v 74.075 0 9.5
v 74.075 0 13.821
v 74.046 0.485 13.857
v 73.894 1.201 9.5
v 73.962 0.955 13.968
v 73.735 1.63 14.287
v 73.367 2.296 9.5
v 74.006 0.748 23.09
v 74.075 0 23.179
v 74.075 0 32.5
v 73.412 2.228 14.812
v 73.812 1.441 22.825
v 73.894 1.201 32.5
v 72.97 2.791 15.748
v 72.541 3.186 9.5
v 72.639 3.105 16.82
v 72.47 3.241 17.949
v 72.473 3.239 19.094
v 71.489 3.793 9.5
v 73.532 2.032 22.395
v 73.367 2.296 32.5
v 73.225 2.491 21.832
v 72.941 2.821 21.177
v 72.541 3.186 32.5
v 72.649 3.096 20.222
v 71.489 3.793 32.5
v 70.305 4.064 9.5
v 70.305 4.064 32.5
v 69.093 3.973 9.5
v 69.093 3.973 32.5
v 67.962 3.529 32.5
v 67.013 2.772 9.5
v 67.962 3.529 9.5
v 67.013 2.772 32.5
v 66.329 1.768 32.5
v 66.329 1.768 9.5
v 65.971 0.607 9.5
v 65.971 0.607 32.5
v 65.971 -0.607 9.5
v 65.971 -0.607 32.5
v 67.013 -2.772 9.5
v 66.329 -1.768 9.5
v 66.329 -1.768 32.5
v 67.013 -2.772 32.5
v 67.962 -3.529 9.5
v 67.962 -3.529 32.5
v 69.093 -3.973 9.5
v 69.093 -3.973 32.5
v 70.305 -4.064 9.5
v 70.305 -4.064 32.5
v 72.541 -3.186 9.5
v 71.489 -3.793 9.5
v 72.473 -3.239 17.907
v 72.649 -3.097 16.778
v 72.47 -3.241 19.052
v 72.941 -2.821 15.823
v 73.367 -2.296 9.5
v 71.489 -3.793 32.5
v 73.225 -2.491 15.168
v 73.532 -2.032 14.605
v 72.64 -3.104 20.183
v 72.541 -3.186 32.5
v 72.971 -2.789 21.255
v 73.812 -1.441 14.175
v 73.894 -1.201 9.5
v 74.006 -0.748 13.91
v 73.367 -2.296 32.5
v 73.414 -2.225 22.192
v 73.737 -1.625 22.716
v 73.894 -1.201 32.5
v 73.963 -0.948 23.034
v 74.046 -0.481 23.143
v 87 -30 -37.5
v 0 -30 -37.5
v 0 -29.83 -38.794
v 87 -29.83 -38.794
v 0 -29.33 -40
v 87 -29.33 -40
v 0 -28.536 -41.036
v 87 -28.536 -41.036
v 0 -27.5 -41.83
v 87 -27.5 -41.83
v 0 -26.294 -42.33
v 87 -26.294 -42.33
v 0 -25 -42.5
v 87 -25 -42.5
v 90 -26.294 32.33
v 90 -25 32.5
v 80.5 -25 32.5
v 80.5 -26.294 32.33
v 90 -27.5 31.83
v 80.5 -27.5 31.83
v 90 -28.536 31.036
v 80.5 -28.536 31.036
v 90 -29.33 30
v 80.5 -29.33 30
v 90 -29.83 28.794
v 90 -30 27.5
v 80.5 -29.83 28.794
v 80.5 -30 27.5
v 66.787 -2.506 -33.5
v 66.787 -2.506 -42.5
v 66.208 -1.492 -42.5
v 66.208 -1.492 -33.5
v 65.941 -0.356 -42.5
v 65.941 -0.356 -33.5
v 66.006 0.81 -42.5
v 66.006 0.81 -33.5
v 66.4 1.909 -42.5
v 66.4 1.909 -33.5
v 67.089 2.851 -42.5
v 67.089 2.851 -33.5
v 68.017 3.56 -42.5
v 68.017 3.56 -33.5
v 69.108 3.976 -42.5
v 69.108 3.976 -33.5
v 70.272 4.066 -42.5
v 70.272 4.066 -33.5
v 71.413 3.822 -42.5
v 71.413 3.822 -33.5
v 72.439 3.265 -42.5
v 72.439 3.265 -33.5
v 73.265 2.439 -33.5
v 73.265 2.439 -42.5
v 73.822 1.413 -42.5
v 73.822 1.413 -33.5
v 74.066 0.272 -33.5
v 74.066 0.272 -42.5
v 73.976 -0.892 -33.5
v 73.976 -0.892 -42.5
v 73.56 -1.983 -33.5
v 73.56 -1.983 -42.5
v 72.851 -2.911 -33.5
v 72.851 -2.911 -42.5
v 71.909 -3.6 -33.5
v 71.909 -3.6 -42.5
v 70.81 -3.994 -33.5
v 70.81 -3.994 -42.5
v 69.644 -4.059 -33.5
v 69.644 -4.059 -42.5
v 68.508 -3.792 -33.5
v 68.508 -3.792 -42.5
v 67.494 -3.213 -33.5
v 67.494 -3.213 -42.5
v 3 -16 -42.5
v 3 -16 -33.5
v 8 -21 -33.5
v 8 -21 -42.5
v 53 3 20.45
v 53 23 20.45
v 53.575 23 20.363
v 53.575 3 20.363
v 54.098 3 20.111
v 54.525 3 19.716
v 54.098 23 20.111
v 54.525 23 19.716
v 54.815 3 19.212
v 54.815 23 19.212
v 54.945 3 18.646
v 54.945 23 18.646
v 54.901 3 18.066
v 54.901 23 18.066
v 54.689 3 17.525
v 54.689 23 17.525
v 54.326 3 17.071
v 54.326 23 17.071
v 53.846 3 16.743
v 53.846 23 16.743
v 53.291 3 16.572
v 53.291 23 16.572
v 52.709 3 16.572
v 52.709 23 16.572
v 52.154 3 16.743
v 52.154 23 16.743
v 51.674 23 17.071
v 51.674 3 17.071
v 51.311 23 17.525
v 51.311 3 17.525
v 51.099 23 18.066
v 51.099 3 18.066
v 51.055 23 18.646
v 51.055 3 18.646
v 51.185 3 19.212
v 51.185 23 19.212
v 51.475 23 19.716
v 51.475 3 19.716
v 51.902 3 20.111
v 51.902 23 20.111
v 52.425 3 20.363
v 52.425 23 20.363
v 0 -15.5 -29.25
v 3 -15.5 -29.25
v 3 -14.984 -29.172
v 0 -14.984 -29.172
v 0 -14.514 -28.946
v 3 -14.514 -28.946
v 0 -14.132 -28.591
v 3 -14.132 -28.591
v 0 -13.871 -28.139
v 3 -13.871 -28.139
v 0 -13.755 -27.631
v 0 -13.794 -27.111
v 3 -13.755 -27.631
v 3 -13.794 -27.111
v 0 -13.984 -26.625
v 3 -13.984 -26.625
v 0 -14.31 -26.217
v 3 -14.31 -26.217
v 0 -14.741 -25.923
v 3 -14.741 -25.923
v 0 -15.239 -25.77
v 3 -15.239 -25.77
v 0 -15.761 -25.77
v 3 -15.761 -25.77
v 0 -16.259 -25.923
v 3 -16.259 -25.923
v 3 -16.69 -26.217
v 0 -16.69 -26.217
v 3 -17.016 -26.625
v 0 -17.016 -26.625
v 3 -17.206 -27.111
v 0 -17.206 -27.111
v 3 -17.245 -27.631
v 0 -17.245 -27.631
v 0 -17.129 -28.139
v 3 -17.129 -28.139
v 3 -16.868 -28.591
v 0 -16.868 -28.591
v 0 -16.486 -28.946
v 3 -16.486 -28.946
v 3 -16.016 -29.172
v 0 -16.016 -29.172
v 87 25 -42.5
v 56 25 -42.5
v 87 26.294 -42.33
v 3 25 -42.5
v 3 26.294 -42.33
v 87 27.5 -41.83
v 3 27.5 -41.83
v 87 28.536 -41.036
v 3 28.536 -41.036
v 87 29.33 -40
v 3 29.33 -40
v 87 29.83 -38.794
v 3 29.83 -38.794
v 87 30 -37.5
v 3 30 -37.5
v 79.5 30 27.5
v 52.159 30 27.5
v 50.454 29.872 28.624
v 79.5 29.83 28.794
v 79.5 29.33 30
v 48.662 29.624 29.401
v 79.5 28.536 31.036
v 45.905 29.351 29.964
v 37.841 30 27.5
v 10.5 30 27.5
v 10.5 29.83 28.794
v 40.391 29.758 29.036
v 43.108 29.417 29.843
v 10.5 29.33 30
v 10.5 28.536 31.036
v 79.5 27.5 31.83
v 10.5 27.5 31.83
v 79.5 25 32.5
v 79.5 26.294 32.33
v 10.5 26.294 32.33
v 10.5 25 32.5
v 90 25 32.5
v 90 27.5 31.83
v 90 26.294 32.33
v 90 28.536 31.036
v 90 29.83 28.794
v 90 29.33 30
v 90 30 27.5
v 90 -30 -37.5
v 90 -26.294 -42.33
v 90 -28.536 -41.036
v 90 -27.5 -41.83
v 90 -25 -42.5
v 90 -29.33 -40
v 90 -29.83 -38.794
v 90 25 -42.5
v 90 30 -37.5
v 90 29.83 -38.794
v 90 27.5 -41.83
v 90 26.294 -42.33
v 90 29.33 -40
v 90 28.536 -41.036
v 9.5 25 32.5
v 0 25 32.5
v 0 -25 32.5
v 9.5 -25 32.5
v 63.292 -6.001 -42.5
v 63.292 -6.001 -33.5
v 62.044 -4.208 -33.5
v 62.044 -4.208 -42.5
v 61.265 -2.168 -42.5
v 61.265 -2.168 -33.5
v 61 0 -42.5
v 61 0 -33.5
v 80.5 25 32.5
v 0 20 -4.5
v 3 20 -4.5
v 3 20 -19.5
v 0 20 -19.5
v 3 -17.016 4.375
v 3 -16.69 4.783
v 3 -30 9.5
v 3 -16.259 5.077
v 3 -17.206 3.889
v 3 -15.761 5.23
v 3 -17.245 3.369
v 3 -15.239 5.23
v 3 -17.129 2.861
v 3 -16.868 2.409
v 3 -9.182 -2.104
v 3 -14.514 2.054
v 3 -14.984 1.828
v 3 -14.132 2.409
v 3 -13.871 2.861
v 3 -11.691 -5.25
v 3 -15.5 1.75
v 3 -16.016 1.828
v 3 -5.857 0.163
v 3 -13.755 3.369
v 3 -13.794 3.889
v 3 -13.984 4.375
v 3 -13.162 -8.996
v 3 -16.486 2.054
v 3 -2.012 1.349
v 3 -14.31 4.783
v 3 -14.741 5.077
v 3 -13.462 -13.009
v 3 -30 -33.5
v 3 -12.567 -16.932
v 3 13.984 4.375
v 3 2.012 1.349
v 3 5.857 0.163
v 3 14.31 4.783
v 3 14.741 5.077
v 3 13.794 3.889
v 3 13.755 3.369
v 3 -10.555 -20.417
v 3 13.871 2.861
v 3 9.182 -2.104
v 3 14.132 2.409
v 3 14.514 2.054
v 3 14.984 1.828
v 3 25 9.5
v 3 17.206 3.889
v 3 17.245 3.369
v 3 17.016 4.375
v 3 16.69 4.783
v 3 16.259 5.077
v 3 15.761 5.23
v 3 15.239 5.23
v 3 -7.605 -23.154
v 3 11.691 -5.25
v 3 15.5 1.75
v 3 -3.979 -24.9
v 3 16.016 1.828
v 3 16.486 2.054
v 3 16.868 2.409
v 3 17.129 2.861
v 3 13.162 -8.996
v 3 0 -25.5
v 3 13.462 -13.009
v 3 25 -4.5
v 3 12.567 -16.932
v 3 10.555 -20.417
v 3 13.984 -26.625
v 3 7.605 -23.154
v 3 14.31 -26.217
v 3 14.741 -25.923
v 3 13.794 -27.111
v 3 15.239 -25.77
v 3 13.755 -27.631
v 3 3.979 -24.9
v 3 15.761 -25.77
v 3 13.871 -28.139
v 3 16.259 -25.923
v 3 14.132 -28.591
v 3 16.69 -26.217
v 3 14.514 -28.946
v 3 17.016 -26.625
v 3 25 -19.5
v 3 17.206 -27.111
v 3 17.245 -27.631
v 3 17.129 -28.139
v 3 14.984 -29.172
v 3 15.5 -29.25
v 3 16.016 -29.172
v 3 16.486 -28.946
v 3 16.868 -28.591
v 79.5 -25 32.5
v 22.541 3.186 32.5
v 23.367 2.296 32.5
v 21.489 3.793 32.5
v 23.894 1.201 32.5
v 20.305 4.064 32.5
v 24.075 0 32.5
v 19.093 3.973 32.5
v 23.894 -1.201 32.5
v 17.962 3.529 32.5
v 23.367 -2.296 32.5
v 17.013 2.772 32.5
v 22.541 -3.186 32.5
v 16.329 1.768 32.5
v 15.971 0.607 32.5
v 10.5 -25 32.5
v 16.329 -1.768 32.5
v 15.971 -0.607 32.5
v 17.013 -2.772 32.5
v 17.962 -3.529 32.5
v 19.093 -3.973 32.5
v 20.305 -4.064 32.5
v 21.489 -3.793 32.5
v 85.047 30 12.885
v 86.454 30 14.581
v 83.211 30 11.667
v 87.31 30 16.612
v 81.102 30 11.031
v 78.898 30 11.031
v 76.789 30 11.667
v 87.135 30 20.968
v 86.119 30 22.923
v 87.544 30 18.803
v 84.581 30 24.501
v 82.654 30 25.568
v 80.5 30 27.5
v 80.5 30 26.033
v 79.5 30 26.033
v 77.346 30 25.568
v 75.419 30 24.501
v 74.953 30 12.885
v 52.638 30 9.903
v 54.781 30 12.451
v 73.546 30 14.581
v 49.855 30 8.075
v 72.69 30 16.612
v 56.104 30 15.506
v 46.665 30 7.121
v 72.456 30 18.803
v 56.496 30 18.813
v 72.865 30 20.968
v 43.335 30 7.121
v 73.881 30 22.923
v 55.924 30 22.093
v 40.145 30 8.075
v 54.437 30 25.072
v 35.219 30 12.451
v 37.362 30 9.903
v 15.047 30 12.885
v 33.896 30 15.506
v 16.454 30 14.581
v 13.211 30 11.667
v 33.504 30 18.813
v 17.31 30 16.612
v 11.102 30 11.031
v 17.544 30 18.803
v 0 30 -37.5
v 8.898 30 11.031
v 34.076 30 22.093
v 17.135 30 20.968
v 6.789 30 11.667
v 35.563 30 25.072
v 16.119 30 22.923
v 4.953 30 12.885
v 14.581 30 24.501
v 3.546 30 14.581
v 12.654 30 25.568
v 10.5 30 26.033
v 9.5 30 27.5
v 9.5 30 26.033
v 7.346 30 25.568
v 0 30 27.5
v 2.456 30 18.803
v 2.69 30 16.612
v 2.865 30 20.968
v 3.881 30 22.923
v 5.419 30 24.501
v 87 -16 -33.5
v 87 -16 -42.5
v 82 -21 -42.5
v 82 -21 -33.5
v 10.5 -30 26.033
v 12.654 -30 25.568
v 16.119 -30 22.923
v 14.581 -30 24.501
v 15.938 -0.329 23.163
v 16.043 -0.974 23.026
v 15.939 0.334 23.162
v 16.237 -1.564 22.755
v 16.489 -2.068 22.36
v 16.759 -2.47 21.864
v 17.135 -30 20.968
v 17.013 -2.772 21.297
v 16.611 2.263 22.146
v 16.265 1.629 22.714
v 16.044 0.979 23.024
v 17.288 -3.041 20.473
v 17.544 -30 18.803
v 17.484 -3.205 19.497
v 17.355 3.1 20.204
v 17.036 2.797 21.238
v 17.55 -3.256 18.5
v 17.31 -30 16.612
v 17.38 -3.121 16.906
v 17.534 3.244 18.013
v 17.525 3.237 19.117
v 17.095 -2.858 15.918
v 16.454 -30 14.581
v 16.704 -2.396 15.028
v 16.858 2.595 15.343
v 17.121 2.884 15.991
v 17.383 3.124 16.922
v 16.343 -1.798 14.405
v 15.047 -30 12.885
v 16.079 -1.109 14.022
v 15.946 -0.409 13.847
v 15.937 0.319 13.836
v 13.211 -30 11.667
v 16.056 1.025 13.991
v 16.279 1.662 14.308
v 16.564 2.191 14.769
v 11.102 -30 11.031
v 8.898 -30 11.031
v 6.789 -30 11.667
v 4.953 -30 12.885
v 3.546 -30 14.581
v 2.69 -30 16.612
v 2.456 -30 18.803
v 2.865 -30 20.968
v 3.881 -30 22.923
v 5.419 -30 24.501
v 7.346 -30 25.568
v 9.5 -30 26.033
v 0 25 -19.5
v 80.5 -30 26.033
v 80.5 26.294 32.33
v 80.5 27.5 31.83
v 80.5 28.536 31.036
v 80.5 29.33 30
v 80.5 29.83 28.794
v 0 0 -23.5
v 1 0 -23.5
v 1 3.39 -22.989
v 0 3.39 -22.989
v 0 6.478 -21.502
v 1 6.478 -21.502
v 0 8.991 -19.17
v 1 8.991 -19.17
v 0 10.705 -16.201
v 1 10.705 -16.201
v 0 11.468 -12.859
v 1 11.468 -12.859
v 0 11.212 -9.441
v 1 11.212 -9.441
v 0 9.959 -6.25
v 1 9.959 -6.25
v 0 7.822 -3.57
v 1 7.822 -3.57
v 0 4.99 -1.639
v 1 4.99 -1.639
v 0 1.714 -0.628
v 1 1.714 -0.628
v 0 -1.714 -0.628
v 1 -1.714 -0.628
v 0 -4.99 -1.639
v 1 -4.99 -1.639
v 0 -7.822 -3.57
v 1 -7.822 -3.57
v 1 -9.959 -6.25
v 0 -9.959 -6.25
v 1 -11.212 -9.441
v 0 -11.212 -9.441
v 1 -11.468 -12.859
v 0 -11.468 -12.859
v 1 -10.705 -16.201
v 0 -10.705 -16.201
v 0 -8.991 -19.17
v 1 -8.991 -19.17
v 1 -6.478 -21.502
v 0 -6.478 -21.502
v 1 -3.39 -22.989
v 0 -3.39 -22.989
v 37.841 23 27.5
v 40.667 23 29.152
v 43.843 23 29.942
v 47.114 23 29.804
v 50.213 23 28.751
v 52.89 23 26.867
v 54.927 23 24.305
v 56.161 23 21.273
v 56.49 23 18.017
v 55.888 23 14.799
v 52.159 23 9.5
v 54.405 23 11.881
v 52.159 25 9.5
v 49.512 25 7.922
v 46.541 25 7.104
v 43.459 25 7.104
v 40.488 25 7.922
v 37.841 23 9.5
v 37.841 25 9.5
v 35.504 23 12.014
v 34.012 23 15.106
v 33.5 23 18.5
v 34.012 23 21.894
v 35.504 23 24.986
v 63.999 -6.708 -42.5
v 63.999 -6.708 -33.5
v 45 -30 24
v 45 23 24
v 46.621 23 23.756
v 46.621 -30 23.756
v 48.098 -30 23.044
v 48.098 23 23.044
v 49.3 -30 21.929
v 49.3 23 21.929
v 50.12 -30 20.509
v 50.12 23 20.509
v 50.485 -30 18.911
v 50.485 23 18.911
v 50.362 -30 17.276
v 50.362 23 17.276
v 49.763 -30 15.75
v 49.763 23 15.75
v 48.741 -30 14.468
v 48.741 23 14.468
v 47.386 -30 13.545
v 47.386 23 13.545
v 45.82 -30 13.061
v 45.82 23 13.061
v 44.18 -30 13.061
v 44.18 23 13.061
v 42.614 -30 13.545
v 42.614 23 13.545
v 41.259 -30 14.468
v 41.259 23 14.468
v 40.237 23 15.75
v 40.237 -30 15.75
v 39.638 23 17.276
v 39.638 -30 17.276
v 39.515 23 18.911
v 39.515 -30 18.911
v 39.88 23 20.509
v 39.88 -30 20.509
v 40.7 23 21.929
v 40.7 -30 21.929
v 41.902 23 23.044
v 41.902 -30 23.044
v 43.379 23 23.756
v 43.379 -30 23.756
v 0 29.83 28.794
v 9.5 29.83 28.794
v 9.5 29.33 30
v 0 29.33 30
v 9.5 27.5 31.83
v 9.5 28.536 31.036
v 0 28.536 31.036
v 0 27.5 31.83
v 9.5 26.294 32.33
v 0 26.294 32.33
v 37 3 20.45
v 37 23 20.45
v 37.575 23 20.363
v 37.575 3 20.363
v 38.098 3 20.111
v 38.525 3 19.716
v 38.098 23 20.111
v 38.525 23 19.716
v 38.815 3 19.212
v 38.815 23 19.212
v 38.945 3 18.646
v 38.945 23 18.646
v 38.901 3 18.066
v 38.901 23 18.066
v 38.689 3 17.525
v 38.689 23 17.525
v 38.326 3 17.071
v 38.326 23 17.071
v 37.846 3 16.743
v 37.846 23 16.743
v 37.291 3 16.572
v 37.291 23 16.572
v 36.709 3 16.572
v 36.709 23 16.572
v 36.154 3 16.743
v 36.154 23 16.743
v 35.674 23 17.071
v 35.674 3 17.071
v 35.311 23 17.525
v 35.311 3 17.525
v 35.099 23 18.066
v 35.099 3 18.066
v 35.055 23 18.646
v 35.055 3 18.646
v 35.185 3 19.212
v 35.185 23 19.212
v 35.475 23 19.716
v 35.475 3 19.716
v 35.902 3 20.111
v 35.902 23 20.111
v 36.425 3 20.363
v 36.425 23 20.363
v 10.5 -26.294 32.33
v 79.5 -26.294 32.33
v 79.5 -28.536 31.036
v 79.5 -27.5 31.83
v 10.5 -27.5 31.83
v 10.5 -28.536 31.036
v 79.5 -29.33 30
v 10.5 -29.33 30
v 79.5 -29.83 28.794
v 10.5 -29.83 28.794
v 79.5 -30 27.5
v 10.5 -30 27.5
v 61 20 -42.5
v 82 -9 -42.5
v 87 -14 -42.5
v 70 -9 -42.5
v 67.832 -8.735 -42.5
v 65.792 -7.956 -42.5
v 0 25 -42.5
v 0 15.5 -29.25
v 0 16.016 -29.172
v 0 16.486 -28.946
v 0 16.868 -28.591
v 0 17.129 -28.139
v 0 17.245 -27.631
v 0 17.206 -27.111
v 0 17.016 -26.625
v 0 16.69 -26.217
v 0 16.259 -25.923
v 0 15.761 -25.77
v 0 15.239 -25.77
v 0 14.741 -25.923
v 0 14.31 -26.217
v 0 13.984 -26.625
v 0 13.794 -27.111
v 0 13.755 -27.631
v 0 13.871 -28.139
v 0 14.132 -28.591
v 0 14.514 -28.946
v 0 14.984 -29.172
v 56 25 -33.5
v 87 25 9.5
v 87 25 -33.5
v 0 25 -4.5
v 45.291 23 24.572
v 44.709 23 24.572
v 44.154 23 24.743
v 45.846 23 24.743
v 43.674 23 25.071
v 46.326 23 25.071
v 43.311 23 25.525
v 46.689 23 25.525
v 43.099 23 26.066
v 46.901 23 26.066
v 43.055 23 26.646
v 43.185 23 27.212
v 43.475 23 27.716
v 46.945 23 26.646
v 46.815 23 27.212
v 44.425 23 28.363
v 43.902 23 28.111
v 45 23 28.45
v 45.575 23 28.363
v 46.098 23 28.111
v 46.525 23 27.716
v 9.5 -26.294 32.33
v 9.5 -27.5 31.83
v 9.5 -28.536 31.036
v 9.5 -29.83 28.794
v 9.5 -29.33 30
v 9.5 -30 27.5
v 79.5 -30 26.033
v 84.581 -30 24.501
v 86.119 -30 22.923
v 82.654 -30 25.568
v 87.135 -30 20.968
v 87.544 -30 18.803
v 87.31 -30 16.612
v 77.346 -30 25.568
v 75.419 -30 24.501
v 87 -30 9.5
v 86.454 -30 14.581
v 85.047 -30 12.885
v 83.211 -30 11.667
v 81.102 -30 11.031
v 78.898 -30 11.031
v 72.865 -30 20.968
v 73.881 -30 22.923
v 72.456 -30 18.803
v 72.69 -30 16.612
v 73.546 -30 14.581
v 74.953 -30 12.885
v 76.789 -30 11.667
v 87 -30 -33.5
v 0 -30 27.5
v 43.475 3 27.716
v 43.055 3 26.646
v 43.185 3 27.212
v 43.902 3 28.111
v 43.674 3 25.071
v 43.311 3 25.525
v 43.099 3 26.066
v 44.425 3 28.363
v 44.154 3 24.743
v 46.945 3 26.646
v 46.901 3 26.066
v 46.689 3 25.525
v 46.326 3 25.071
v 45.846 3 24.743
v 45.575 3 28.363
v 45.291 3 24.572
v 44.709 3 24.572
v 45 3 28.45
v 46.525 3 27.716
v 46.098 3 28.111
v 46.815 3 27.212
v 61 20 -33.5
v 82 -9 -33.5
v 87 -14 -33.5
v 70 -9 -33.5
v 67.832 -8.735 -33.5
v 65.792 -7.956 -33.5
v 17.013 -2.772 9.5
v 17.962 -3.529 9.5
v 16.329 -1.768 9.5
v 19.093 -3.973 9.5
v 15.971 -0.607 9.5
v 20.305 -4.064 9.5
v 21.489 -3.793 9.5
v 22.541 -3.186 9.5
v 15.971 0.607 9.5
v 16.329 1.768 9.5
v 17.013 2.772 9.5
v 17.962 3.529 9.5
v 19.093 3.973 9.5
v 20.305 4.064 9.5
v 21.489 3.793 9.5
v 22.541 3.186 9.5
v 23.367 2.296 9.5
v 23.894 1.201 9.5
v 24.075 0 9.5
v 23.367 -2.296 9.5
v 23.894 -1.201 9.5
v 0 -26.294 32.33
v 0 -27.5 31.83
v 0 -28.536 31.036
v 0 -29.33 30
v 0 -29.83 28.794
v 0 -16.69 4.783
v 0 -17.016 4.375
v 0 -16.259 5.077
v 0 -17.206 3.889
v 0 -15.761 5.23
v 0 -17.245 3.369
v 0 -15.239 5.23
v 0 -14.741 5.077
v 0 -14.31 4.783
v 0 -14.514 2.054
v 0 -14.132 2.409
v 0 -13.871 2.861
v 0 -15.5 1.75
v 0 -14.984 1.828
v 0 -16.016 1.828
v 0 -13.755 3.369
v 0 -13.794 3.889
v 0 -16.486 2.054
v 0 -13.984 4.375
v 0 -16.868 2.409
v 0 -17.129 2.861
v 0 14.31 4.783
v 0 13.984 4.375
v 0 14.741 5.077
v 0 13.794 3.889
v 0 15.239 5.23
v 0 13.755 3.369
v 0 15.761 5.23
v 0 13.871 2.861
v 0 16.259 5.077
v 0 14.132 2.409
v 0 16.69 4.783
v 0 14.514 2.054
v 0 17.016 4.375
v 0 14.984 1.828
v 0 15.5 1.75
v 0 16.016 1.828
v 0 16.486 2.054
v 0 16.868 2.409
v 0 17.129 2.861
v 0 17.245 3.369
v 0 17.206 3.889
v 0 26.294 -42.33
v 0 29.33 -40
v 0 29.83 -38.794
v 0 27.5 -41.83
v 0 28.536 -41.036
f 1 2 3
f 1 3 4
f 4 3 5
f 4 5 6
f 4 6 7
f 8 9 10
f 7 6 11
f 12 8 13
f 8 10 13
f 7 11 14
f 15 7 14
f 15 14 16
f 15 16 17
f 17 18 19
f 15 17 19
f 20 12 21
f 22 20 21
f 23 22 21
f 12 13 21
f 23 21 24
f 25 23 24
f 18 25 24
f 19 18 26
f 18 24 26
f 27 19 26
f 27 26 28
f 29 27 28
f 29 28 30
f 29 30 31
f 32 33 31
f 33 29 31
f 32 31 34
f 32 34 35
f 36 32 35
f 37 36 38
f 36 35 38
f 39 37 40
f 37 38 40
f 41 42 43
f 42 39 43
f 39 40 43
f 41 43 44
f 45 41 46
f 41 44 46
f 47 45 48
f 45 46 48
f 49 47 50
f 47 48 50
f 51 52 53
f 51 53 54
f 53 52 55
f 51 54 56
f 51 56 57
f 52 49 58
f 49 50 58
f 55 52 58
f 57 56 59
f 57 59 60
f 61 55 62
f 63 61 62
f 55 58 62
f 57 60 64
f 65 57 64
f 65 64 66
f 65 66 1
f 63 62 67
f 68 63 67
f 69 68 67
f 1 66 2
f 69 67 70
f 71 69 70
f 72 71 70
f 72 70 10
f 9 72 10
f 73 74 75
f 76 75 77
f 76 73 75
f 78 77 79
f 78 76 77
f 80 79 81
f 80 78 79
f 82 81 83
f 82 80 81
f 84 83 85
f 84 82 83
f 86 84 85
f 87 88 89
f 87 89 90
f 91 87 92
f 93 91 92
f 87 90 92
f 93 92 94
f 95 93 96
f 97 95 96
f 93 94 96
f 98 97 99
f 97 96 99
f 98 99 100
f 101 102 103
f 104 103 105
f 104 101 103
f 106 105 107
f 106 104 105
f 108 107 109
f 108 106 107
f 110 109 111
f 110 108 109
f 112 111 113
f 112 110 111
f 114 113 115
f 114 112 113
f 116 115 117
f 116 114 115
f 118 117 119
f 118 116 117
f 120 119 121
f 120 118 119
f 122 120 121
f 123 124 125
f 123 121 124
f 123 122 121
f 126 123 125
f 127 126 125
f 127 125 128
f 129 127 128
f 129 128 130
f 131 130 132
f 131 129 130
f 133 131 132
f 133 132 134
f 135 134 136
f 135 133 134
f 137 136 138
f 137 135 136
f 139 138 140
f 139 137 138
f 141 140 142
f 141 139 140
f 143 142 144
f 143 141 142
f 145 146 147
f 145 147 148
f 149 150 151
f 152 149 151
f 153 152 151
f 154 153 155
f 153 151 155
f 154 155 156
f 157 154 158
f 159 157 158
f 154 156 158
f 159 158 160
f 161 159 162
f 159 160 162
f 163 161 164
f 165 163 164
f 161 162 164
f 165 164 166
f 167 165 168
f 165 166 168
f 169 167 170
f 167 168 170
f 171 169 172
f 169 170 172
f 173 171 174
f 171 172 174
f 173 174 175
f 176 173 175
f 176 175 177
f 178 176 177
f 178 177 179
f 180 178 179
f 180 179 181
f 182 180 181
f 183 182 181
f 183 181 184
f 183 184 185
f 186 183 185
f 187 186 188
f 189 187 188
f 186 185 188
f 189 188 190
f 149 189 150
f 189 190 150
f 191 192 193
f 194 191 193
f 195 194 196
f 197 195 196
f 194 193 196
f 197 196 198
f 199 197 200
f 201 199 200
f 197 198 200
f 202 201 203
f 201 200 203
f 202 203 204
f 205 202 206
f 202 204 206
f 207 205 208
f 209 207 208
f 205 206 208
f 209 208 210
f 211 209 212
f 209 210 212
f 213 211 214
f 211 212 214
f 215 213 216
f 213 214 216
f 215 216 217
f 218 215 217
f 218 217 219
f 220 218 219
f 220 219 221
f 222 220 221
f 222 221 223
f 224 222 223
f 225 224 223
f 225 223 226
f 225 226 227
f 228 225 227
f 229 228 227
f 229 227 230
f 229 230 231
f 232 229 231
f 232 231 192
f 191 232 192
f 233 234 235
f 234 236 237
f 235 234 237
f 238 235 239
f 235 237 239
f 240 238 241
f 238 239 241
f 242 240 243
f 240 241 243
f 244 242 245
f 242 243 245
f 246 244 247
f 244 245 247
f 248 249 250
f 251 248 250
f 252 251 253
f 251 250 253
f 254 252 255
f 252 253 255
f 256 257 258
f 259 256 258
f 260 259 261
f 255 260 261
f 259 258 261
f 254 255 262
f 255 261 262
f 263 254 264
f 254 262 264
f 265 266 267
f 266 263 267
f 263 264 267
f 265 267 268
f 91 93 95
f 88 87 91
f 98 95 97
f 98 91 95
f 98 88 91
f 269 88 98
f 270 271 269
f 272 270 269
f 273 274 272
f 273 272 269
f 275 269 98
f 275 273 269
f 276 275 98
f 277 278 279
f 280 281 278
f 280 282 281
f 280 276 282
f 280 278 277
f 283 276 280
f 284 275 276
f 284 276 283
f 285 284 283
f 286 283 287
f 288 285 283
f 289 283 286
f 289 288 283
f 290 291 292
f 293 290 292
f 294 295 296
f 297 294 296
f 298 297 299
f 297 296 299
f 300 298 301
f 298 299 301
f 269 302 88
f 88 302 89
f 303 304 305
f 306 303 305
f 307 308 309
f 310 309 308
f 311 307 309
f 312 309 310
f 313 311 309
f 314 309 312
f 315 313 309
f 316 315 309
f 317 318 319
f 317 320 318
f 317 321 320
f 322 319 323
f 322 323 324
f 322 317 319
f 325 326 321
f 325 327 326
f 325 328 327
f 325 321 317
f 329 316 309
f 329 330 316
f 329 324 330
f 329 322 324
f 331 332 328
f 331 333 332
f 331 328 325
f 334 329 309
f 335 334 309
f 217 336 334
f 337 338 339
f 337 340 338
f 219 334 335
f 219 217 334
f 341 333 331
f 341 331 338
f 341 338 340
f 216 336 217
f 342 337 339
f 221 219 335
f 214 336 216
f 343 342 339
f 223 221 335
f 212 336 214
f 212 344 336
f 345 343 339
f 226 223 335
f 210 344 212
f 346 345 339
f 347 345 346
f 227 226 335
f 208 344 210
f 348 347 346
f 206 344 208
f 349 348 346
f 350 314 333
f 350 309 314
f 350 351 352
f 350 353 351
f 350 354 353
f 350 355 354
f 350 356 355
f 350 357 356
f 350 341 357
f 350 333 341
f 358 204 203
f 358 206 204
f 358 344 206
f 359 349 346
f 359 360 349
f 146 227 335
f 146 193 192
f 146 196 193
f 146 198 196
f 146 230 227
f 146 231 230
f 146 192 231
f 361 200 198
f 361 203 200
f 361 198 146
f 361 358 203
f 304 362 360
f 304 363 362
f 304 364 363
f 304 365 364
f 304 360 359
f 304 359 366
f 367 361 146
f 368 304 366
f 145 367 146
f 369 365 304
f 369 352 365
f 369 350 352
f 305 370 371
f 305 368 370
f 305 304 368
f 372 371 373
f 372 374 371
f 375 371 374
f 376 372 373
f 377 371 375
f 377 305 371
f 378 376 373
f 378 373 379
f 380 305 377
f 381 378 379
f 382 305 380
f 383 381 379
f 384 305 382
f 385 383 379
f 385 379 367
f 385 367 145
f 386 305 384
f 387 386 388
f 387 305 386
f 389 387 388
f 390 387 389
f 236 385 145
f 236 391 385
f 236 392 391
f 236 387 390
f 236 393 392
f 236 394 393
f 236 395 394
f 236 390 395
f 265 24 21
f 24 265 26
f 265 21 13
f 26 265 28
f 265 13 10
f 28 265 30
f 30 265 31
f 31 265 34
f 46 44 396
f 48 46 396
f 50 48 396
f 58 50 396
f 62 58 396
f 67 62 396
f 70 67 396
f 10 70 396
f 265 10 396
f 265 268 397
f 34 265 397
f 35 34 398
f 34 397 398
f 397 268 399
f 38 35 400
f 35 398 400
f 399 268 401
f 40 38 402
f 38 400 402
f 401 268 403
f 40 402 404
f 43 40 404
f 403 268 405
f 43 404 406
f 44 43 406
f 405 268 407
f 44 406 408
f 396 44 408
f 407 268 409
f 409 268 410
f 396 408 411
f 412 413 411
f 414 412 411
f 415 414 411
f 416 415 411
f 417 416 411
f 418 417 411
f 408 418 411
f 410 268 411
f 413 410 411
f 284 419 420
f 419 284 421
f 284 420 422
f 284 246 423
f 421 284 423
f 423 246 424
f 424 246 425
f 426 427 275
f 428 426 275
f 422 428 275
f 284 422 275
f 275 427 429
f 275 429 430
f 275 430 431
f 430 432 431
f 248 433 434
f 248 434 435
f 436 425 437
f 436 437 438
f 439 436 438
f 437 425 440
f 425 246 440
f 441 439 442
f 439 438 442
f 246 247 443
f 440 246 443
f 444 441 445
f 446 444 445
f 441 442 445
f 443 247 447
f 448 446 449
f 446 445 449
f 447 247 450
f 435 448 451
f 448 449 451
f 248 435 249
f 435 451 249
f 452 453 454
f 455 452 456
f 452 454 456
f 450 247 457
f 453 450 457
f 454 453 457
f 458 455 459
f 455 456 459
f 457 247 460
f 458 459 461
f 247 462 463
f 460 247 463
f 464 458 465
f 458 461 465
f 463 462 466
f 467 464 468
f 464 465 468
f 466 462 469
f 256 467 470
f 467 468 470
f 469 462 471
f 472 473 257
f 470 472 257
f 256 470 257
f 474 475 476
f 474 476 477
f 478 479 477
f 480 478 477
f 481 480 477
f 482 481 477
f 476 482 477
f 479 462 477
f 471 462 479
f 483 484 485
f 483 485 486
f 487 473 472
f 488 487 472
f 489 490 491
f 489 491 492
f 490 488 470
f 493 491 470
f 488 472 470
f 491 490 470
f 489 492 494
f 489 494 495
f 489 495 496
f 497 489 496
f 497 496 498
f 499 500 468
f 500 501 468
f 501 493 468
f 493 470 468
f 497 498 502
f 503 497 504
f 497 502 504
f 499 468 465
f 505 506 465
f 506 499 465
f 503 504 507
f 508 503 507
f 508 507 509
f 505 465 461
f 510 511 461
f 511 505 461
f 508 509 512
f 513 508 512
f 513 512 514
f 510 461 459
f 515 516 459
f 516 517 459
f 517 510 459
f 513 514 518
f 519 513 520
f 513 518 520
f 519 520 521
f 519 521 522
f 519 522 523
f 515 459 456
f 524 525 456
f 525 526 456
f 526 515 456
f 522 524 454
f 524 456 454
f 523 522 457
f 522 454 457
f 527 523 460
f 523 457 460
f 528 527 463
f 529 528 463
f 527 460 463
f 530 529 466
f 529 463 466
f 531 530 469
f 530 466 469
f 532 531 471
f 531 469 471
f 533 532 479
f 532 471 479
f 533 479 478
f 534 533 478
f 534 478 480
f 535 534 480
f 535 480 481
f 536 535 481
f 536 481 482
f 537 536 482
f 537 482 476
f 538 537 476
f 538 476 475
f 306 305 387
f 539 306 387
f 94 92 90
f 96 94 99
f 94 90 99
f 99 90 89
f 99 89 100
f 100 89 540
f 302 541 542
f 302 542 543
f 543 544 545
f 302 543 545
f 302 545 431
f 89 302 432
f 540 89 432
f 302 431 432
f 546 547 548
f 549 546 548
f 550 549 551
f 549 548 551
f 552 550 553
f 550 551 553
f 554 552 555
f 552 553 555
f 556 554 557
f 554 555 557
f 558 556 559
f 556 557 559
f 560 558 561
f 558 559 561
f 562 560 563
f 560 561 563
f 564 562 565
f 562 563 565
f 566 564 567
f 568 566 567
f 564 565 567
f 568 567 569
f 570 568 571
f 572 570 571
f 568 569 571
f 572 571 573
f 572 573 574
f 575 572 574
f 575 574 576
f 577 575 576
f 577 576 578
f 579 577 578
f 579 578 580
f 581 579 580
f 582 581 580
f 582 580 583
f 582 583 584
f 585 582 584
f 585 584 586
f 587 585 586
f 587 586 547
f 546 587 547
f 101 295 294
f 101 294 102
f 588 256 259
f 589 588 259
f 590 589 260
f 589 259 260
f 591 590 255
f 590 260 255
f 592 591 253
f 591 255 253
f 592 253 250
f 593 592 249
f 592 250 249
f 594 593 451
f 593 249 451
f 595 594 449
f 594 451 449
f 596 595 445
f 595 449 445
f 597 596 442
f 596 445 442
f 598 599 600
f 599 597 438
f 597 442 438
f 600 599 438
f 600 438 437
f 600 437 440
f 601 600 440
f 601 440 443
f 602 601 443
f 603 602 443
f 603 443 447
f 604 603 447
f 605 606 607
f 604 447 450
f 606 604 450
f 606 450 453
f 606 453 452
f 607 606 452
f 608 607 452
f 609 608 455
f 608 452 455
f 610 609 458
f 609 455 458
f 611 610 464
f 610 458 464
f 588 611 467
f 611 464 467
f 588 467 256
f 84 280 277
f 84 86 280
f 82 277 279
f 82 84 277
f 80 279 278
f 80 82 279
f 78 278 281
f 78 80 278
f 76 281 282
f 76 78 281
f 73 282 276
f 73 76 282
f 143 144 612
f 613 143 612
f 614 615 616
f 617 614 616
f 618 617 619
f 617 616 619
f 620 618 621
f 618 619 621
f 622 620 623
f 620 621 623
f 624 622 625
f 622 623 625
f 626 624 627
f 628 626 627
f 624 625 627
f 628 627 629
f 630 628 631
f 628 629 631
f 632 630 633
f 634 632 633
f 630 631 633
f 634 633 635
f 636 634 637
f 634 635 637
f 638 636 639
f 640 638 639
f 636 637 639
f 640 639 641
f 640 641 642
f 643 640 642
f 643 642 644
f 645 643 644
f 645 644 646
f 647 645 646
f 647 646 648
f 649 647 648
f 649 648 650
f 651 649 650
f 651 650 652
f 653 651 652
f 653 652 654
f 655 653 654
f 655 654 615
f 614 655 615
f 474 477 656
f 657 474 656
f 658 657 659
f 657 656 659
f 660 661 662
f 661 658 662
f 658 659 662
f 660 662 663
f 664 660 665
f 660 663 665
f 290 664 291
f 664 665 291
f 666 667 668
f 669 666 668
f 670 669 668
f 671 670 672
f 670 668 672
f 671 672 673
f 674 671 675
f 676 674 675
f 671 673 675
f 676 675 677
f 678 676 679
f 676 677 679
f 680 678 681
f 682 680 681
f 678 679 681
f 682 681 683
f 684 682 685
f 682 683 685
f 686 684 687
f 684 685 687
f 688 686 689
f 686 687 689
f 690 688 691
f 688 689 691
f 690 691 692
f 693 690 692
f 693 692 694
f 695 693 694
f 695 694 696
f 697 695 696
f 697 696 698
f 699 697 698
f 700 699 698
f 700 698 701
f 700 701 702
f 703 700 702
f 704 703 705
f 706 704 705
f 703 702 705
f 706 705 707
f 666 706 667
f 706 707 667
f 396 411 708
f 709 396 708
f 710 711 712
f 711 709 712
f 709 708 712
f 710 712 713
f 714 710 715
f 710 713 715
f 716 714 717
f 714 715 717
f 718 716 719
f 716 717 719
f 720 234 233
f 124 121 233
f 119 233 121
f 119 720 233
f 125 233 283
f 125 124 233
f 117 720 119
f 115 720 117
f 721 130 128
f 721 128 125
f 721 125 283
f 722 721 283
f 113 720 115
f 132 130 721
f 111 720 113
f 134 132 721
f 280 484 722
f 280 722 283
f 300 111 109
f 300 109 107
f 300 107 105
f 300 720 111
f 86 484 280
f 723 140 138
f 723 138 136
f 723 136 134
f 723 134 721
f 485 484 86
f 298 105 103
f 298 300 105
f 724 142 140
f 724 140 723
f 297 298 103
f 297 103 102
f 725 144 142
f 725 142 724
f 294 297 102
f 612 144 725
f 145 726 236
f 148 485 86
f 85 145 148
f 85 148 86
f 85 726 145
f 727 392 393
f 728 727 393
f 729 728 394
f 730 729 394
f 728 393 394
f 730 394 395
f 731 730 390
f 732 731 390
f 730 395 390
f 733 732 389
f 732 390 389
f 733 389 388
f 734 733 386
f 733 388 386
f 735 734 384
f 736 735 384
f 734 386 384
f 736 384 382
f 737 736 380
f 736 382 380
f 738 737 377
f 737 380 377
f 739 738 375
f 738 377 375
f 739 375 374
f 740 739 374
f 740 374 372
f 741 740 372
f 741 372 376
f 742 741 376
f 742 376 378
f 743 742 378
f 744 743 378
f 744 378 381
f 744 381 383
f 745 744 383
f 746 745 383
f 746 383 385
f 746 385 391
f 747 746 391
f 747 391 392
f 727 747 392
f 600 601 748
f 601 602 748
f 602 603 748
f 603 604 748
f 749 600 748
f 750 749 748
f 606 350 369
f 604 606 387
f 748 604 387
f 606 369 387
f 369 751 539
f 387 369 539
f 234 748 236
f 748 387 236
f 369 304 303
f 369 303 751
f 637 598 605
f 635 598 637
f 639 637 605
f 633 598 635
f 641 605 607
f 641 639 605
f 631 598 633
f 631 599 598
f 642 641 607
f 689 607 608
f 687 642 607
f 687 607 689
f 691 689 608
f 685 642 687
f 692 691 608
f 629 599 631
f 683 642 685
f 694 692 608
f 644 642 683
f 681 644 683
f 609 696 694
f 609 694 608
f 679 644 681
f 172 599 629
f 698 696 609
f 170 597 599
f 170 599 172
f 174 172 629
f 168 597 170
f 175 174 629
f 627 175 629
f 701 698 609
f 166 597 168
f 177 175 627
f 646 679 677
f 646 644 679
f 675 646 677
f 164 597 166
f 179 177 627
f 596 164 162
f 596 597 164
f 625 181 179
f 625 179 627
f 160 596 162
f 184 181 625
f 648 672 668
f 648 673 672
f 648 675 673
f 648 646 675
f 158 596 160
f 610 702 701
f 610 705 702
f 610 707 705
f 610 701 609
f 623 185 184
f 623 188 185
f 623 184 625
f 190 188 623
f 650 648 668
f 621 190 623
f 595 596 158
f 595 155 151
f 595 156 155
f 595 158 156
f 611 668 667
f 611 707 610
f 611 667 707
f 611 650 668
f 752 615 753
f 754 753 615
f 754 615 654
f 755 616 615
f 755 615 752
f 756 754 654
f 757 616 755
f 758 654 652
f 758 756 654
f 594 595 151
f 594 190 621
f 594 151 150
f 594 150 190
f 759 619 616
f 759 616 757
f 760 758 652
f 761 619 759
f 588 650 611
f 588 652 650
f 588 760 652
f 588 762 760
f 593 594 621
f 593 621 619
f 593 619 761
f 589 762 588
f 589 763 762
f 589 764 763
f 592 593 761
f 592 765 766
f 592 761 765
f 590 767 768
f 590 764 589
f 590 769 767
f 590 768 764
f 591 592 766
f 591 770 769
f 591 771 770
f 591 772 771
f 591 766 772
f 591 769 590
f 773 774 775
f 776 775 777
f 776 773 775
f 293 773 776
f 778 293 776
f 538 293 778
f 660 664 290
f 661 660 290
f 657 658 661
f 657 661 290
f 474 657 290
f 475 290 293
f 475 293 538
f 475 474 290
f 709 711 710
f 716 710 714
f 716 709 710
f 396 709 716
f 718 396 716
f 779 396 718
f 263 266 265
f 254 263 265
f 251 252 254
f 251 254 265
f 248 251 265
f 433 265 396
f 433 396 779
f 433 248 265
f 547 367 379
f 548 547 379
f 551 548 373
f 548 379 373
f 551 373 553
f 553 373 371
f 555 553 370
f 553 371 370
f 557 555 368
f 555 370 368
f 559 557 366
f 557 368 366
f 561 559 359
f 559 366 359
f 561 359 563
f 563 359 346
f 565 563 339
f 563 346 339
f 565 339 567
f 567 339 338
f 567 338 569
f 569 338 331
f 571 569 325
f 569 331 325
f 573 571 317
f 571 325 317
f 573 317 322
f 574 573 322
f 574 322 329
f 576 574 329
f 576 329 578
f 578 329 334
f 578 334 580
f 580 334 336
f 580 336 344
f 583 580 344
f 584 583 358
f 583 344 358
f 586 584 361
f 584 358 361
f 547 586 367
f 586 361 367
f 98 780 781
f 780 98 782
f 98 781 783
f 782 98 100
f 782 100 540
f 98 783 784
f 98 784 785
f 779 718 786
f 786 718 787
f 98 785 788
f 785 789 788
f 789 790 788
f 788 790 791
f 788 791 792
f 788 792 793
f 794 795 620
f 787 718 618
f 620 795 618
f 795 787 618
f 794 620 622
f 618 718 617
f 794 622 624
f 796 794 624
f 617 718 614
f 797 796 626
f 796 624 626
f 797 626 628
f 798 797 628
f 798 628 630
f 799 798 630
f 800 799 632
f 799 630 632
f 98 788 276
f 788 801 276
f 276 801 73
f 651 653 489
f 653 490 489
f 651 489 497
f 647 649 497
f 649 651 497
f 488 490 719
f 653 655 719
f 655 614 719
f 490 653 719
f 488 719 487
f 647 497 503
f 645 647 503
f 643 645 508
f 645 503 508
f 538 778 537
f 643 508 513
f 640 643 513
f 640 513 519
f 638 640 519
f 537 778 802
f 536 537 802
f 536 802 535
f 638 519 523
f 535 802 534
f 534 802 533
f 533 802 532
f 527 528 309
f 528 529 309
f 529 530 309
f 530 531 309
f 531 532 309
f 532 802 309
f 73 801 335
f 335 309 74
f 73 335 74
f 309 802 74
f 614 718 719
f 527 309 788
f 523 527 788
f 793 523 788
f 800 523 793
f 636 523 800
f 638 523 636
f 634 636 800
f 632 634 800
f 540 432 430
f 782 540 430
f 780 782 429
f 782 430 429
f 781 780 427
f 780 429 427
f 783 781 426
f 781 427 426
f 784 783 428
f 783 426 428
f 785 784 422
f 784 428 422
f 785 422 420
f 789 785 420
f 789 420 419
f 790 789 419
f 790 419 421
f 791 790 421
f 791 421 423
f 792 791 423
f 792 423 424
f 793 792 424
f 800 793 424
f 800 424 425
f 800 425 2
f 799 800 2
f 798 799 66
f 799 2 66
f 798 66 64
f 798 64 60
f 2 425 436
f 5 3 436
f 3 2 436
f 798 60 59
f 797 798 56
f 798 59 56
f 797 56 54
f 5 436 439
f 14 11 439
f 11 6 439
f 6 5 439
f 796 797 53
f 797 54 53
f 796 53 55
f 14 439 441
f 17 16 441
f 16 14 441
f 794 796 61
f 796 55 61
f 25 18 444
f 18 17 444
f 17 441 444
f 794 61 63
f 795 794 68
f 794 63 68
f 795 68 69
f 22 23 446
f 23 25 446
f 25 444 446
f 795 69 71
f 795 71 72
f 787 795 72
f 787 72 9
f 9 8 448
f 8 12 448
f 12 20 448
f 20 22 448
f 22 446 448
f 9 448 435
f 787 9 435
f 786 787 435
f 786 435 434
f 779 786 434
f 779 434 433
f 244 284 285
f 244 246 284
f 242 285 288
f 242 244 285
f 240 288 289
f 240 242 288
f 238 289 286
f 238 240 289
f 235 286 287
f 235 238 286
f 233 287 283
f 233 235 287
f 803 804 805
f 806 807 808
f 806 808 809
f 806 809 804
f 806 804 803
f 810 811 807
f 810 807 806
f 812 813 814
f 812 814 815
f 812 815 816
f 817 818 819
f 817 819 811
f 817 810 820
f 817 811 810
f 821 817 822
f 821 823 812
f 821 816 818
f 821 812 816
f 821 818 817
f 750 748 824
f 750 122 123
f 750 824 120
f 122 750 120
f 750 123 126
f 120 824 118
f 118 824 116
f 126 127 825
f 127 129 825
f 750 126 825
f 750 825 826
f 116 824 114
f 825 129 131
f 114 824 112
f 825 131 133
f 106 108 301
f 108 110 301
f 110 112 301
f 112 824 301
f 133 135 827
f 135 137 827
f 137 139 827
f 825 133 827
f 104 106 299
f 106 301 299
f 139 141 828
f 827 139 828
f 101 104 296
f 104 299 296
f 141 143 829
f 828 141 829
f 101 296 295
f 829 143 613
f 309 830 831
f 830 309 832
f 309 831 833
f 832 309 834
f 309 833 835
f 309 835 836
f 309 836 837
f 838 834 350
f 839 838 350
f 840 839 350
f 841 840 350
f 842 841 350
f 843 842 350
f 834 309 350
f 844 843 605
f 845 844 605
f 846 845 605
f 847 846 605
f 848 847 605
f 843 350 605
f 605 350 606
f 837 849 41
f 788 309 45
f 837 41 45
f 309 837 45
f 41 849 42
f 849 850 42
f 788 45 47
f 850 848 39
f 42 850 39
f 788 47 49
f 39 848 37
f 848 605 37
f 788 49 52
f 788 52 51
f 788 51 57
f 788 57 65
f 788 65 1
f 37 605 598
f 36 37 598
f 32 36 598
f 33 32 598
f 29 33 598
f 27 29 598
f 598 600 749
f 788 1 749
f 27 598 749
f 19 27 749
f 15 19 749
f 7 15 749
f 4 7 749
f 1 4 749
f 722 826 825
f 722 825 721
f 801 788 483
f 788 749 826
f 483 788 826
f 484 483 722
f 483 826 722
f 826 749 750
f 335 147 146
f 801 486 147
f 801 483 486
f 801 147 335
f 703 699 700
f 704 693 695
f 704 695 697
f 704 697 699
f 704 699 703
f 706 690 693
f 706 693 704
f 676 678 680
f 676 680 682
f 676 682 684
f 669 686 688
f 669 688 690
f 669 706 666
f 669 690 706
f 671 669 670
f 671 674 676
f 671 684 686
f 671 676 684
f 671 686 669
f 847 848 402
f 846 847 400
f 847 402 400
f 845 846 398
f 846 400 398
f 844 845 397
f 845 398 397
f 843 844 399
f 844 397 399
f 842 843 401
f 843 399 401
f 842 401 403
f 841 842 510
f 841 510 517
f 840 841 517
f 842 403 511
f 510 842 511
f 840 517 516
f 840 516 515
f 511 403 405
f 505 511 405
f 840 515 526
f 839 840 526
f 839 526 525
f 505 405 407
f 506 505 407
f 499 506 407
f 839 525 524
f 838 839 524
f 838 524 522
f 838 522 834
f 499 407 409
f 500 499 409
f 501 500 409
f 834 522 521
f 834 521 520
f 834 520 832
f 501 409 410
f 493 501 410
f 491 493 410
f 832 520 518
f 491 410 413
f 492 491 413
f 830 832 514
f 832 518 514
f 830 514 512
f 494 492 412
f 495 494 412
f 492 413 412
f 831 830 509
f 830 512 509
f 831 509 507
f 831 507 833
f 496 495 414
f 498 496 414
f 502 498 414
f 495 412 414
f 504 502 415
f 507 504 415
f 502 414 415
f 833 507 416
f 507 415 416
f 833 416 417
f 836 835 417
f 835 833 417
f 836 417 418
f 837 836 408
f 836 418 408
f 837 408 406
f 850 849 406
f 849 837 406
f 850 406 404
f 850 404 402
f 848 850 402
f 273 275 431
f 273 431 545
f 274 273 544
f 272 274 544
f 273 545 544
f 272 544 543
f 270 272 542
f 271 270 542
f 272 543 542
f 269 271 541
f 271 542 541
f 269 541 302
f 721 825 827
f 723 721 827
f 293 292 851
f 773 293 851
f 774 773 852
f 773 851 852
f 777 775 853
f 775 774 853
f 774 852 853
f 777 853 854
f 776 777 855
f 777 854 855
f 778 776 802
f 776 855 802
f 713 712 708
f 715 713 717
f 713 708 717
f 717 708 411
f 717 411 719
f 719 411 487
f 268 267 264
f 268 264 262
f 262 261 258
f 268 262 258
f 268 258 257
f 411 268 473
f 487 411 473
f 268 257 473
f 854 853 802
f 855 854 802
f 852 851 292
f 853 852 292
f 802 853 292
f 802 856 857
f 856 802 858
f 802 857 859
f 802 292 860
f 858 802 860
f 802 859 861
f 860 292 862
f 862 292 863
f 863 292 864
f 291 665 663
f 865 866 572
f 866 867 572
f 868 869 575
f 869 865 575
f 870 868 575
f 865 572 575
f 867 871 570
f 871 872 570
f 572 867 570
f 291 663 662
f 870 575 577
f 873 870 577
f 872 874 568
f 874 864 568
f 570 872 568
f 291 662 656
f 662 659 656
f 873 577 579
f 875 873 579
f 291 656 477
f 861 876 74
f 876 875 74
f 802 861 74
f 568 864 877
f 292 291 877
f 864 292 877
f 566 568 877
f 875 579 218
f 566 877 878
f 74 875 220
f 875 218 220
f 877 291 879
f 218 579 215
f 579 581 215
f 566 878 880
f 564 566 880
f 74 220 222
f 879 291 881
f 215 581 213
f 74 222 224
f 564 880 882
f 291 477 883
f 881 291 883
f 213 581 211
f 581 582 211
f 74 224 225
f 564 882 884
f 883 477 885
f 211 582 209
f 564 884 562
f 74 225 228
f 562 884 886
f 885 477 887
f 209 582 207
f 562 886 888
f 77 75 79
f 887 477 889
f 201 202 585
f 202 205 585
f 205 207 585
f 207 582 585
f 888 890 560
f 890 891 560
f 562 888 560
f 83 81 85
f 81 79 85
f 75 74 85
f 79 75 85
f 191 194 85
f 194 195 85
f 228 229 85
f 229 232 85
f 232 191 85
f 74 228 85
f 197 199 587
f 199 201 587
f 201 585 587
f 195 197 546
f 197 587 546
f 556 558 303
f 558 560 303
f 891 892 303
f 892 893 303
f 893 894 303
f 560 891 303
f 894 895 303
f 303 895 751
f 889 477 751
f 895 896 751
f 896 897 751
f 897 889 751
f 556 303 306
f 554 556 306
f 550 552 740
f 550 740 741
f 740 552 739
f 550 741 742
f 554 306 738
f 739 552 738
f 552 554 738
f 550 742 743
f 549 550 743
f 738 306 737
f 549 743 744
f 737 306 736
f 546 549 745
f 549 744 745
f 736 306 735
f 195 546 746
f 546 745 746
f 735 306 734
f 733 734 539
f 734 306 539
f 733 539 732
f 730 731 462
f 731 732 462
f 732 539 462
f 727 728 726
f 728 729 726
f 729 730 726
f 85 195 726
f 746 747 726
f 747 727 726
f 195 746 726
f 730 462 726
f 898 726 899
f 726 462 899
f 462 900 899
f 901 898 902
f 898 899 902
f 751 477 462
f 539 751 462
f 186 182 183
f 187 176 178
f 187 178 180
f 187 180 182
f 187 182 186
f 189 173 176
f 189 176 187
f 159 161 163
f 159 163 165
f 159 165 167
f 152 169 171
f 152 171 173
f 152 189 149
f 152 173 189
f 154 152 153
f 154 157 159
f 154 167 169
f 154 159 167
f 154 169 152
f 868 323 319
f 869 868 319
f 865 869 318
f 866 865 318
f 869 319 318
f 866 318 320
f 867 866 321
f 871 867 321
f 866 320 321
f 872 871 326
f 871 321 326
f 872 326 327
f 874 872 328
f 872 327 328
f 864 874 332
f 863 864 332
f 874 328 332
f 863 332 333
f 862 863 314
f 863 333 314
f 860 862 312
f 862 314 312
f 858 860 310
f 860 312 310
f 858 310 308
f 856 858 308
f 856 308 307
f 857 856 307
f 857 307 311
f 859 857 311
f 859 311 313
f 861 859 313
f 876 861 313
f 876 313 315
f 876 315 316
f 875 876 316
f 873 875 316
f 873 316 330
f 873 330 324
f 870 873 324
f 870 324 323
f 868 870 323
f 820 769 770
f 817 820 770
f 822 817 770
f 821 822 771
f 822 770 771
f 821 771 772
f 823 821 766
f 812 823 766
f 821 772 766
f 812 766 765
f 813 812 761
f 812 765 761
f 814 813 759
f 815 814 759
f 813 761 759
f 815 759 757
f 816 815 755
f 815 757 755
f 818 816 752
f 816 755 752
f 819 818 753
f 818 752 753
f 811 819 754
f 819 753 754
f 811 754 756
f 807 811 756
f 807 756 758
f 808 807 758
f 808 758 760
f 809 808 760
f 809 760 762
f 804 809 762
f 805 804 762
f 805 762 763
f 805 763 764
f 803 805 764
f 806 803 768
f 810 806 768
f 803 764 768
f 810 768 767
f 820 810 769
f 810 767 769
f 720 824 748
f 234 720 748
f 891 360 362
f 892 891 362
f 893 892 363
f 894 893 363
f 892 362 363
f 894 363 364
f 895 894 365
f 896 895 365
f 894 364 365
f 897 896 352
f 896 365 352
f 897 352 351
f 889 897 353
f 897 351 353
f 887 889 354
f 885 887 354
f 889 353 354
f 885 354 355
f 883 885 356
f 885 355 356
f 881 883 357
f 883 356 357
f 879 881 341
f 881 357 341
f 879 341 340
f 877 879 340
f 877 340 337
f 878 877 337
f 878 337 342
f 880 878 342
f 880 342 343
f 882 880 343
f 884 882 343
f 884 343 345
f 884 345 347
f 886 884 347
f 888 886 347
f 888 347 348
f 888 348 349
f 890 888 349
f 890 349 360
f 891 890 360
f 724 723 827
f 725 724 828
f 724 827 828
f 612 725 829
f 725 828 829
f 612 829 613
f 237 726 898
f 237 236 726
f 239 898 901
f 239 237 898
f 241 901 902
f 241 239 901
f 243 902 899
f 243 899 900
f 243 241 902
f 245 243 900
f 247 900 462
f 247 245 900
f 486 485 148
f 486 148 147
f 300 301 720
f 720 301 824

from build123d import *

# Parameters (mm, degrees)
BOSS_EXTRUDE1_DEPTH          = 90
SKETCH2_R                    = 7.55
SKETCH2_R_2                  = 5.5
CUT_EXTRUDE1_DEPTH           = 90
SKETCH3_R                    = 4.075
CUT_EXTRUDE2_DEPTH           = 90
CUT_EXTRUDE3_START           = -42
SKETCH4_W                    = 84
SKETCH4_H                    = 50
SKETCH4_R                    = 4.075
CUT_EXTRUDE3_DEPTH           = 42
SKETCH5_R                    = 11.5
SKETCH5_R_2                  = 1.75
CUT_EXTRUDE4_DEPTH           = 42
SKETCH10_W                   = 1
SKETCH10_H                   = 23.85052841
CUT_EXTRUDE_THIN1_DEPTH      = 70
CHAMFER2_SIZE                = 2
BOSS_EXTRUDE4_DEPTH          = 3
SKETCH15_W                   = 15
SKETCH15_H                   = 60
BOSS_EXTRUDE5_DEPTH          = 3
FILLET1_R                    = 5
SKETCH16_W                   = 84
SKETCH16_H                   = 42
CUT_EXTRUDE5_DEPTH           = 10
BOSS_EXTRUDE6_DEPTH          = 84
BOSS_EXTRUDE7_START          = -9
SKETCH18_R                   = 4.075
BOSS_EXTRUDE7_DEPTH          = 9
CUT_EXTRUDE_THIN3_DEPTH      = 121.933866311
CUT_EXTRUDE_THIN3_DEPTH_BACK = 9
SKETCH21_R                   = 11.5
CUT_EXTRUDE7_DEPTH           = 7
SKETCH22_R                   = 1.95
CUT_EXTRUDE8_DEPTH           = 20
SKETCH23_W                   = 15
SKETCH23_H                   = 5
CUT_EXTRUDE9_DEPTH           = 20
BOSS_EXTRUDE8_REACH          = 103.367
CHAMFER3_SIZE                = 5
CHAMFER4_SIZE                = 5


with BuildPart() as part:
    # Sketch1 → Boss-Extrude1 (new body)
    with BuildSketch(Plane(origin=(0, 0, 0), x_dir=(0, 0, -1), z_dir=(1, 0, 0))):
        with BuildLine():
            Line((-27.5, -30), (27.5, -30))
            ThreePointArc((27.5, -30), (31.035533906, -28.535533906), (32.5, -25))
            Line((32.5, -25), (32.5, 25))
            ThreePointArc((32.5, 25), (31.035533906, 28.535533906), (27.5, 30))
            Line((27.5, 30), (-27.5, 30))
            ThreePointArc((-27.5, 30), (-31.035533906, 28.535533906), (-32.5, 25))
            Line((-32.5, 25), (-32.5, -25))
            ThreePointArc((-32.5, -25), (-31.035533906, -28.535533906), (-27.5, -30))
        make_face()
    extrude(amount=BOSS_EXTRUDE1_DEPTH)

    # Sketch2 → Cut-Extrude1 (cut)
    with BuildSketch(Plane(origin=(0, 30, 0), x_dir=(1, 0, 0), z_dir=(0, 1, 0))):
        with Locations(Location((10, -18.5, 0), (0, 0, 270))):
            Circle(SKETCH2_R)
        with Locations(Location((80, -18.5, 0), (0, 0, 270))):
            Circle(SKETCH2_R)
        with Locations(Location((45, -18.5, 0), (0, 0, 270))):
            Circle(SKETCH2_R_2)
    extrude(amount=-CUT_EXTRUDE1_DEPTH, mode=Mode.SUBTRACT)

    # Sketch3 → Cut-Extrude2 (cut)
    with BuildSketch(Plane.XY.offset(32.5)):
        with Locations((20, 0)):
            Circle(SKETCH3_R)
        with Locations((70, 0)):
            Circle(SKETCH3_R)
    extrude(amount=-CUT_EXTRUDE2_DEPTH, mode=Mode.SUBTRACT)

    # Sketch4 → Cut-Extrude3 (cut)
    with BuildSketch(Plane(origin=(0, 0, -32.5), x_dir=(-1, 0, 0), z_dir=(0, 0, -1)).offset(CUT_EXTRUDE3_START)):
        with Locations((-45, 0)):
            Rectangle(SKETCH4_W, SKETCH4_H)
        with Locations(Location((-70, 0, 0), (0, 0, 180))):
            Circle(SKETCH4_R, mode=Mode.SUBTRACT)
        with Locations(Location((-20, 0, 0), (0, 0, 180))):
            Circle(SKETCH4_R, mode=Mode.SUBTRACT)
    extrude(amount=CUT_EXTRUDE3_DEPTH, mode=Mode.SUBTRACT)

    # Sketch5 → Cut-Extrude4 (cut)
    with BuildSketch(Plane(origin=(3, 0, 0), x_dir=(0, 0, -1), z_dir=(1, 0, 0))):
        with Locations((12, 0)):
            Circle(SKETCH5_R)
        with Locations((-3.5, 15.5)):
            Circle(SKETCH5_R_2)
        with Locations((27.5, 15.5)):
            Circle(SKETCH5_R_2)
        with Locations((27.5, -15.5)):
            Circle(SKETCH5_R_2)
        with Locations((-3.5, -15.5)):
            Circle(SKETCH5_R_2)
    extrude(amount=-CUT_EXTRUDE4_DEPTH, mode=Mode.SUBTRACT)

    # Sketch10 → Cut-Extrude-Thin1 (cut)
    with BuildSketch(Plane(origin=(0, 30, 0), x_dir=(1, 0, 0), z_dir=(0, 1, 0))):
        with Locations((10, -30.425264205)):
            Rectangle(SKETCH10_W, SKETCH10_H)
        with Locations((80, -30.425264205)):
            Rectangle(SKETCH10_W, SKETCH10_H)
    extrude(amount=-CUT_EXTRUDE_THIN1_DEPTH, mode=Mode.SUBTRACT)

    # Chamfer2
    chamfer2_edges = [part.edges().sort_by_distance(p)[0] for p in [
        (3, 0, -0.5),
    ]]
    chamfer(chamfer2_edges, length=CHAMFER2_SIZE)

    # Sketch14 → Boss-Extrude4 (add)
    with BuildSketch(Plane.ZY):
        with BuildLine():
            Line((-27.5, -30), (-42.5, -30))
            Line((-42.5, -30), (-42.5, 30))
            Line((-42.5, 30), (-27.5, 30))
            ThreePointArc((-27.5, 30), (-31.035533906, 28.535533906), (-32.5, 25))
            Line((-32.5, 25), (-32.5, -25))
            ThreePointArc((-32.5, -25), (-31.035533906, -28.535533906), (-27.5, -30))
        make_face()
    extrude(amount=-BOSS_EXTRUDE4_DEPTH)

    # Sketch15 → Boss-Extrude5 (add)
    with BuildSketch(Plane(origin=(90, 0, 0), x_dir=(0, 0, -1), z_dir=(1, 0, 0))):
        with Locations((35, 0)):
            Rectangle(SKETCH15_W, SKETCH15_H)
    extrude(amount=-BOSS_EXTRUDE5_DEPTH)

    # Fillet1
    fillet1_edges = [part.edges().sort_by_distance(p)[0] for p in [
        (1.5, -30, -42.5),
        (1.5, 30, -42.5),
        (88.5, 30, -42.5),
        (88.5, -30, -42.5),
    ]]
    fillet(fillet1_edges, radius=FILLET1_R)

    # Sketch16 → Cut-Extrude5 (cut)
    with BuildSketch(Plane(origin=(0, -25, 0), x_dir=(1, 0, 0), z_dir=(0, 1, 0))):
        with Locations((45, 11.5)):
            Rectangle(SKETCH16_W, SKETCH16_H)
    extrude(amount=-CUT_EXTRUDE5_DEPTH, mode=Mode.SUBTRACT)

    # Sketch17 → Boss-Extrude6 (add)
    with BuildSketch(Plane(origin=(3, 0, 0), x_dir=(0, 0, -1), z_dir=(1, 0, 0))):
        with BuildLine():
            Line((32.5, 25), (42.5, 25))
            ThreePointArc((42.5, 25), (41.035533906, 28.535533906), (37.5, 30))
            Line((37.5, 30), (27.5, 30))
            ThreePointArc((27.5, 30), (31.035533906, 28.535533906), (32.5, 25))
        make_face()
    extrude(amount=BOSS_EXTRUDE6_DEPTH)

    # Sketch18 → Boss-Extrude7 (add)
    with BuildSketch(Plane(origin=(0, 0, -42.5), x_dir=(-1, 0, 0), z_dir=(0, 0, -1)).offset(BOSS_EXTRUDE7_START)):
        with BuildLine():
            Line((-61, 0), (-61, 25))
            Line((-61, 25), (-87, 25))
            Line((-87, 25), (-87, -9))
            Line((-87, -9), (-70, -9))
            ThreePointArc((-70, -9), (-63.636038969, -6.363961031), (-61, 0))
        make_face()
        with Locations(Location((-70, 0, 0), (0, 0, 180))):
            Circle(SKETCH18_R, mode=Mode.SUBTRACT)
    extrude(amount=BOSS_EXTRUDE7_DEPTH)

    # Sketch19 → Cut-Extrude-Thin3 (cut, two sides: drawn at the far end of the back side and taken through both)
    with BuildSketch(Plane(origin=(0, 0, -42.5), x_dir=(-1, 0, 0), z_dir=(0, 0, -1)).offset(-CUT_EXTRUDE_THIN3_DEPTH_BACK)):
        Polygon((-61.965111244, -7.327781975), (-63.282485579, -6.01040764), (-66.764986476, -2.527906743), (-68.355005201, -0.937888018), (-69.062111982, -1.644994799), (-67.472093257, -3.235013524), (-63.98959236, -6.717514421), (-62.672218025, -8.034888756), align=None)
    extrude(amount=CUT_EXTRUDE_THIN3_DEPTH + CUT_EXTRUDE_THIN3_DEPTH_BACK, mode=Mode.SUBTRACT)

    # Sketch21 → Cut-Extrude7 (cut)
    with BuildSketch(Plane(origin=(0, 30, 0), x_dir=(1, 0, 0), z_dir=(0, 1, 0))):
        with Locations(Location((45, -18.5, 0), (0, 0, 231.500049591))):
            Circle(SKETCH21_R)
    extrude(amount=-CUT_EXTRUDE7_DEPTH, mode=Mode.SUBTRACT)

    # Sketch22 → Cut-Extrude8 (cut)
    with BuildSketch(Plane(origin=(0, 23, 0), x_dir=(1, 0, 0), z_dir=(0, 1, 0))):
        with Locations(Location((53, -18.5, 0), (0, 0, 270))):
            Circle(SKETCH22_R)
        with Locations(Location((45, -26.5, 0), (0, 0, 270))):
            Circle(SKETCH22_R)
        with Locations(Location((37, -18.5, 0), (0, 0, 270))):
            Circle(SKETCH22_R)
    extrude(amount=-CUT_EXTRUDE8_DEPTH, mode=Mode.SUBTRACT)

    # Sketch23 → Cut-Extrude9 (cut)
    with BuildSketch(Plane(origin=(3, 0, 0), x_dir=(0, 0, -1), z_dir=(1, 0, 0))):
        with Locations((12, 22.5)):
            Rectangle(SKETCH23_W, SKETCH23_H)
    extrude(amount=-CUT_EXTRUDE9_DEPTH, mode=Mode.SUBTRACT)

    # Sketch24 → Boss-Extrude8 (add, up to next)
    with BuildSketch(Plane.ZY.offset(-87), mode=Mode.PRIVATE) as boss_extrude8_sk1:
        with BuildLine():
            Line((-42.5, -21), (-33.5, -21))
            Line((-33.5, -21), (-33.5, -30))
            Line((-33.5, -30), (-37.5, -30))
            ThreePointArc((-37.5, -30), (-41.035533906, -28.535533906), (-42.5, -25))
            Line((-42.5, -25), (-42.5, -21))
        make_face()
    boss_extrude8_tool1 = extrude(boss_extrude8_sk1.sketch, amount=BOSS_EXTRUDE8_REACH, mode=Mode.PRIVATE) - part.part
    add(boss_extrude8_tool1.solids().sort_by_distance((87, -25.260021, -37.760021))[0])

    # Chamfer3
    chamfer3_edges = [part.edges().sort_by_distance(p)[0] for p in [
        (87, -9, -38),
        (3, -21, -38),
        (87, -21, -38),
    ]]
    chamfer(chamfer3_edges, length=CHAMFER3_SIZE)

    # Chamfer4
    # the kernel refuses this chamfer: 5 mm, written as the material it adds along each edge
    with BuildSketch(Plane(origin=(61, 25, -33.5), x_dir=(0.027495876610586317, -0.9996219169112968, 0), z_dir=(0, 0, -1))) as chamfer4_piece_1:
        Polygon((CHAMFER4_SIZE * 0.999621916911, CHAMFER4_SIZE * 0.0274958766106), (-CHAMFER4_SIZE * 0.0274958766106, CHAMFER4_SIZE * 0.999621916911), (0, 0), align=None)
    extrude(amount=9)


solid = part.part
